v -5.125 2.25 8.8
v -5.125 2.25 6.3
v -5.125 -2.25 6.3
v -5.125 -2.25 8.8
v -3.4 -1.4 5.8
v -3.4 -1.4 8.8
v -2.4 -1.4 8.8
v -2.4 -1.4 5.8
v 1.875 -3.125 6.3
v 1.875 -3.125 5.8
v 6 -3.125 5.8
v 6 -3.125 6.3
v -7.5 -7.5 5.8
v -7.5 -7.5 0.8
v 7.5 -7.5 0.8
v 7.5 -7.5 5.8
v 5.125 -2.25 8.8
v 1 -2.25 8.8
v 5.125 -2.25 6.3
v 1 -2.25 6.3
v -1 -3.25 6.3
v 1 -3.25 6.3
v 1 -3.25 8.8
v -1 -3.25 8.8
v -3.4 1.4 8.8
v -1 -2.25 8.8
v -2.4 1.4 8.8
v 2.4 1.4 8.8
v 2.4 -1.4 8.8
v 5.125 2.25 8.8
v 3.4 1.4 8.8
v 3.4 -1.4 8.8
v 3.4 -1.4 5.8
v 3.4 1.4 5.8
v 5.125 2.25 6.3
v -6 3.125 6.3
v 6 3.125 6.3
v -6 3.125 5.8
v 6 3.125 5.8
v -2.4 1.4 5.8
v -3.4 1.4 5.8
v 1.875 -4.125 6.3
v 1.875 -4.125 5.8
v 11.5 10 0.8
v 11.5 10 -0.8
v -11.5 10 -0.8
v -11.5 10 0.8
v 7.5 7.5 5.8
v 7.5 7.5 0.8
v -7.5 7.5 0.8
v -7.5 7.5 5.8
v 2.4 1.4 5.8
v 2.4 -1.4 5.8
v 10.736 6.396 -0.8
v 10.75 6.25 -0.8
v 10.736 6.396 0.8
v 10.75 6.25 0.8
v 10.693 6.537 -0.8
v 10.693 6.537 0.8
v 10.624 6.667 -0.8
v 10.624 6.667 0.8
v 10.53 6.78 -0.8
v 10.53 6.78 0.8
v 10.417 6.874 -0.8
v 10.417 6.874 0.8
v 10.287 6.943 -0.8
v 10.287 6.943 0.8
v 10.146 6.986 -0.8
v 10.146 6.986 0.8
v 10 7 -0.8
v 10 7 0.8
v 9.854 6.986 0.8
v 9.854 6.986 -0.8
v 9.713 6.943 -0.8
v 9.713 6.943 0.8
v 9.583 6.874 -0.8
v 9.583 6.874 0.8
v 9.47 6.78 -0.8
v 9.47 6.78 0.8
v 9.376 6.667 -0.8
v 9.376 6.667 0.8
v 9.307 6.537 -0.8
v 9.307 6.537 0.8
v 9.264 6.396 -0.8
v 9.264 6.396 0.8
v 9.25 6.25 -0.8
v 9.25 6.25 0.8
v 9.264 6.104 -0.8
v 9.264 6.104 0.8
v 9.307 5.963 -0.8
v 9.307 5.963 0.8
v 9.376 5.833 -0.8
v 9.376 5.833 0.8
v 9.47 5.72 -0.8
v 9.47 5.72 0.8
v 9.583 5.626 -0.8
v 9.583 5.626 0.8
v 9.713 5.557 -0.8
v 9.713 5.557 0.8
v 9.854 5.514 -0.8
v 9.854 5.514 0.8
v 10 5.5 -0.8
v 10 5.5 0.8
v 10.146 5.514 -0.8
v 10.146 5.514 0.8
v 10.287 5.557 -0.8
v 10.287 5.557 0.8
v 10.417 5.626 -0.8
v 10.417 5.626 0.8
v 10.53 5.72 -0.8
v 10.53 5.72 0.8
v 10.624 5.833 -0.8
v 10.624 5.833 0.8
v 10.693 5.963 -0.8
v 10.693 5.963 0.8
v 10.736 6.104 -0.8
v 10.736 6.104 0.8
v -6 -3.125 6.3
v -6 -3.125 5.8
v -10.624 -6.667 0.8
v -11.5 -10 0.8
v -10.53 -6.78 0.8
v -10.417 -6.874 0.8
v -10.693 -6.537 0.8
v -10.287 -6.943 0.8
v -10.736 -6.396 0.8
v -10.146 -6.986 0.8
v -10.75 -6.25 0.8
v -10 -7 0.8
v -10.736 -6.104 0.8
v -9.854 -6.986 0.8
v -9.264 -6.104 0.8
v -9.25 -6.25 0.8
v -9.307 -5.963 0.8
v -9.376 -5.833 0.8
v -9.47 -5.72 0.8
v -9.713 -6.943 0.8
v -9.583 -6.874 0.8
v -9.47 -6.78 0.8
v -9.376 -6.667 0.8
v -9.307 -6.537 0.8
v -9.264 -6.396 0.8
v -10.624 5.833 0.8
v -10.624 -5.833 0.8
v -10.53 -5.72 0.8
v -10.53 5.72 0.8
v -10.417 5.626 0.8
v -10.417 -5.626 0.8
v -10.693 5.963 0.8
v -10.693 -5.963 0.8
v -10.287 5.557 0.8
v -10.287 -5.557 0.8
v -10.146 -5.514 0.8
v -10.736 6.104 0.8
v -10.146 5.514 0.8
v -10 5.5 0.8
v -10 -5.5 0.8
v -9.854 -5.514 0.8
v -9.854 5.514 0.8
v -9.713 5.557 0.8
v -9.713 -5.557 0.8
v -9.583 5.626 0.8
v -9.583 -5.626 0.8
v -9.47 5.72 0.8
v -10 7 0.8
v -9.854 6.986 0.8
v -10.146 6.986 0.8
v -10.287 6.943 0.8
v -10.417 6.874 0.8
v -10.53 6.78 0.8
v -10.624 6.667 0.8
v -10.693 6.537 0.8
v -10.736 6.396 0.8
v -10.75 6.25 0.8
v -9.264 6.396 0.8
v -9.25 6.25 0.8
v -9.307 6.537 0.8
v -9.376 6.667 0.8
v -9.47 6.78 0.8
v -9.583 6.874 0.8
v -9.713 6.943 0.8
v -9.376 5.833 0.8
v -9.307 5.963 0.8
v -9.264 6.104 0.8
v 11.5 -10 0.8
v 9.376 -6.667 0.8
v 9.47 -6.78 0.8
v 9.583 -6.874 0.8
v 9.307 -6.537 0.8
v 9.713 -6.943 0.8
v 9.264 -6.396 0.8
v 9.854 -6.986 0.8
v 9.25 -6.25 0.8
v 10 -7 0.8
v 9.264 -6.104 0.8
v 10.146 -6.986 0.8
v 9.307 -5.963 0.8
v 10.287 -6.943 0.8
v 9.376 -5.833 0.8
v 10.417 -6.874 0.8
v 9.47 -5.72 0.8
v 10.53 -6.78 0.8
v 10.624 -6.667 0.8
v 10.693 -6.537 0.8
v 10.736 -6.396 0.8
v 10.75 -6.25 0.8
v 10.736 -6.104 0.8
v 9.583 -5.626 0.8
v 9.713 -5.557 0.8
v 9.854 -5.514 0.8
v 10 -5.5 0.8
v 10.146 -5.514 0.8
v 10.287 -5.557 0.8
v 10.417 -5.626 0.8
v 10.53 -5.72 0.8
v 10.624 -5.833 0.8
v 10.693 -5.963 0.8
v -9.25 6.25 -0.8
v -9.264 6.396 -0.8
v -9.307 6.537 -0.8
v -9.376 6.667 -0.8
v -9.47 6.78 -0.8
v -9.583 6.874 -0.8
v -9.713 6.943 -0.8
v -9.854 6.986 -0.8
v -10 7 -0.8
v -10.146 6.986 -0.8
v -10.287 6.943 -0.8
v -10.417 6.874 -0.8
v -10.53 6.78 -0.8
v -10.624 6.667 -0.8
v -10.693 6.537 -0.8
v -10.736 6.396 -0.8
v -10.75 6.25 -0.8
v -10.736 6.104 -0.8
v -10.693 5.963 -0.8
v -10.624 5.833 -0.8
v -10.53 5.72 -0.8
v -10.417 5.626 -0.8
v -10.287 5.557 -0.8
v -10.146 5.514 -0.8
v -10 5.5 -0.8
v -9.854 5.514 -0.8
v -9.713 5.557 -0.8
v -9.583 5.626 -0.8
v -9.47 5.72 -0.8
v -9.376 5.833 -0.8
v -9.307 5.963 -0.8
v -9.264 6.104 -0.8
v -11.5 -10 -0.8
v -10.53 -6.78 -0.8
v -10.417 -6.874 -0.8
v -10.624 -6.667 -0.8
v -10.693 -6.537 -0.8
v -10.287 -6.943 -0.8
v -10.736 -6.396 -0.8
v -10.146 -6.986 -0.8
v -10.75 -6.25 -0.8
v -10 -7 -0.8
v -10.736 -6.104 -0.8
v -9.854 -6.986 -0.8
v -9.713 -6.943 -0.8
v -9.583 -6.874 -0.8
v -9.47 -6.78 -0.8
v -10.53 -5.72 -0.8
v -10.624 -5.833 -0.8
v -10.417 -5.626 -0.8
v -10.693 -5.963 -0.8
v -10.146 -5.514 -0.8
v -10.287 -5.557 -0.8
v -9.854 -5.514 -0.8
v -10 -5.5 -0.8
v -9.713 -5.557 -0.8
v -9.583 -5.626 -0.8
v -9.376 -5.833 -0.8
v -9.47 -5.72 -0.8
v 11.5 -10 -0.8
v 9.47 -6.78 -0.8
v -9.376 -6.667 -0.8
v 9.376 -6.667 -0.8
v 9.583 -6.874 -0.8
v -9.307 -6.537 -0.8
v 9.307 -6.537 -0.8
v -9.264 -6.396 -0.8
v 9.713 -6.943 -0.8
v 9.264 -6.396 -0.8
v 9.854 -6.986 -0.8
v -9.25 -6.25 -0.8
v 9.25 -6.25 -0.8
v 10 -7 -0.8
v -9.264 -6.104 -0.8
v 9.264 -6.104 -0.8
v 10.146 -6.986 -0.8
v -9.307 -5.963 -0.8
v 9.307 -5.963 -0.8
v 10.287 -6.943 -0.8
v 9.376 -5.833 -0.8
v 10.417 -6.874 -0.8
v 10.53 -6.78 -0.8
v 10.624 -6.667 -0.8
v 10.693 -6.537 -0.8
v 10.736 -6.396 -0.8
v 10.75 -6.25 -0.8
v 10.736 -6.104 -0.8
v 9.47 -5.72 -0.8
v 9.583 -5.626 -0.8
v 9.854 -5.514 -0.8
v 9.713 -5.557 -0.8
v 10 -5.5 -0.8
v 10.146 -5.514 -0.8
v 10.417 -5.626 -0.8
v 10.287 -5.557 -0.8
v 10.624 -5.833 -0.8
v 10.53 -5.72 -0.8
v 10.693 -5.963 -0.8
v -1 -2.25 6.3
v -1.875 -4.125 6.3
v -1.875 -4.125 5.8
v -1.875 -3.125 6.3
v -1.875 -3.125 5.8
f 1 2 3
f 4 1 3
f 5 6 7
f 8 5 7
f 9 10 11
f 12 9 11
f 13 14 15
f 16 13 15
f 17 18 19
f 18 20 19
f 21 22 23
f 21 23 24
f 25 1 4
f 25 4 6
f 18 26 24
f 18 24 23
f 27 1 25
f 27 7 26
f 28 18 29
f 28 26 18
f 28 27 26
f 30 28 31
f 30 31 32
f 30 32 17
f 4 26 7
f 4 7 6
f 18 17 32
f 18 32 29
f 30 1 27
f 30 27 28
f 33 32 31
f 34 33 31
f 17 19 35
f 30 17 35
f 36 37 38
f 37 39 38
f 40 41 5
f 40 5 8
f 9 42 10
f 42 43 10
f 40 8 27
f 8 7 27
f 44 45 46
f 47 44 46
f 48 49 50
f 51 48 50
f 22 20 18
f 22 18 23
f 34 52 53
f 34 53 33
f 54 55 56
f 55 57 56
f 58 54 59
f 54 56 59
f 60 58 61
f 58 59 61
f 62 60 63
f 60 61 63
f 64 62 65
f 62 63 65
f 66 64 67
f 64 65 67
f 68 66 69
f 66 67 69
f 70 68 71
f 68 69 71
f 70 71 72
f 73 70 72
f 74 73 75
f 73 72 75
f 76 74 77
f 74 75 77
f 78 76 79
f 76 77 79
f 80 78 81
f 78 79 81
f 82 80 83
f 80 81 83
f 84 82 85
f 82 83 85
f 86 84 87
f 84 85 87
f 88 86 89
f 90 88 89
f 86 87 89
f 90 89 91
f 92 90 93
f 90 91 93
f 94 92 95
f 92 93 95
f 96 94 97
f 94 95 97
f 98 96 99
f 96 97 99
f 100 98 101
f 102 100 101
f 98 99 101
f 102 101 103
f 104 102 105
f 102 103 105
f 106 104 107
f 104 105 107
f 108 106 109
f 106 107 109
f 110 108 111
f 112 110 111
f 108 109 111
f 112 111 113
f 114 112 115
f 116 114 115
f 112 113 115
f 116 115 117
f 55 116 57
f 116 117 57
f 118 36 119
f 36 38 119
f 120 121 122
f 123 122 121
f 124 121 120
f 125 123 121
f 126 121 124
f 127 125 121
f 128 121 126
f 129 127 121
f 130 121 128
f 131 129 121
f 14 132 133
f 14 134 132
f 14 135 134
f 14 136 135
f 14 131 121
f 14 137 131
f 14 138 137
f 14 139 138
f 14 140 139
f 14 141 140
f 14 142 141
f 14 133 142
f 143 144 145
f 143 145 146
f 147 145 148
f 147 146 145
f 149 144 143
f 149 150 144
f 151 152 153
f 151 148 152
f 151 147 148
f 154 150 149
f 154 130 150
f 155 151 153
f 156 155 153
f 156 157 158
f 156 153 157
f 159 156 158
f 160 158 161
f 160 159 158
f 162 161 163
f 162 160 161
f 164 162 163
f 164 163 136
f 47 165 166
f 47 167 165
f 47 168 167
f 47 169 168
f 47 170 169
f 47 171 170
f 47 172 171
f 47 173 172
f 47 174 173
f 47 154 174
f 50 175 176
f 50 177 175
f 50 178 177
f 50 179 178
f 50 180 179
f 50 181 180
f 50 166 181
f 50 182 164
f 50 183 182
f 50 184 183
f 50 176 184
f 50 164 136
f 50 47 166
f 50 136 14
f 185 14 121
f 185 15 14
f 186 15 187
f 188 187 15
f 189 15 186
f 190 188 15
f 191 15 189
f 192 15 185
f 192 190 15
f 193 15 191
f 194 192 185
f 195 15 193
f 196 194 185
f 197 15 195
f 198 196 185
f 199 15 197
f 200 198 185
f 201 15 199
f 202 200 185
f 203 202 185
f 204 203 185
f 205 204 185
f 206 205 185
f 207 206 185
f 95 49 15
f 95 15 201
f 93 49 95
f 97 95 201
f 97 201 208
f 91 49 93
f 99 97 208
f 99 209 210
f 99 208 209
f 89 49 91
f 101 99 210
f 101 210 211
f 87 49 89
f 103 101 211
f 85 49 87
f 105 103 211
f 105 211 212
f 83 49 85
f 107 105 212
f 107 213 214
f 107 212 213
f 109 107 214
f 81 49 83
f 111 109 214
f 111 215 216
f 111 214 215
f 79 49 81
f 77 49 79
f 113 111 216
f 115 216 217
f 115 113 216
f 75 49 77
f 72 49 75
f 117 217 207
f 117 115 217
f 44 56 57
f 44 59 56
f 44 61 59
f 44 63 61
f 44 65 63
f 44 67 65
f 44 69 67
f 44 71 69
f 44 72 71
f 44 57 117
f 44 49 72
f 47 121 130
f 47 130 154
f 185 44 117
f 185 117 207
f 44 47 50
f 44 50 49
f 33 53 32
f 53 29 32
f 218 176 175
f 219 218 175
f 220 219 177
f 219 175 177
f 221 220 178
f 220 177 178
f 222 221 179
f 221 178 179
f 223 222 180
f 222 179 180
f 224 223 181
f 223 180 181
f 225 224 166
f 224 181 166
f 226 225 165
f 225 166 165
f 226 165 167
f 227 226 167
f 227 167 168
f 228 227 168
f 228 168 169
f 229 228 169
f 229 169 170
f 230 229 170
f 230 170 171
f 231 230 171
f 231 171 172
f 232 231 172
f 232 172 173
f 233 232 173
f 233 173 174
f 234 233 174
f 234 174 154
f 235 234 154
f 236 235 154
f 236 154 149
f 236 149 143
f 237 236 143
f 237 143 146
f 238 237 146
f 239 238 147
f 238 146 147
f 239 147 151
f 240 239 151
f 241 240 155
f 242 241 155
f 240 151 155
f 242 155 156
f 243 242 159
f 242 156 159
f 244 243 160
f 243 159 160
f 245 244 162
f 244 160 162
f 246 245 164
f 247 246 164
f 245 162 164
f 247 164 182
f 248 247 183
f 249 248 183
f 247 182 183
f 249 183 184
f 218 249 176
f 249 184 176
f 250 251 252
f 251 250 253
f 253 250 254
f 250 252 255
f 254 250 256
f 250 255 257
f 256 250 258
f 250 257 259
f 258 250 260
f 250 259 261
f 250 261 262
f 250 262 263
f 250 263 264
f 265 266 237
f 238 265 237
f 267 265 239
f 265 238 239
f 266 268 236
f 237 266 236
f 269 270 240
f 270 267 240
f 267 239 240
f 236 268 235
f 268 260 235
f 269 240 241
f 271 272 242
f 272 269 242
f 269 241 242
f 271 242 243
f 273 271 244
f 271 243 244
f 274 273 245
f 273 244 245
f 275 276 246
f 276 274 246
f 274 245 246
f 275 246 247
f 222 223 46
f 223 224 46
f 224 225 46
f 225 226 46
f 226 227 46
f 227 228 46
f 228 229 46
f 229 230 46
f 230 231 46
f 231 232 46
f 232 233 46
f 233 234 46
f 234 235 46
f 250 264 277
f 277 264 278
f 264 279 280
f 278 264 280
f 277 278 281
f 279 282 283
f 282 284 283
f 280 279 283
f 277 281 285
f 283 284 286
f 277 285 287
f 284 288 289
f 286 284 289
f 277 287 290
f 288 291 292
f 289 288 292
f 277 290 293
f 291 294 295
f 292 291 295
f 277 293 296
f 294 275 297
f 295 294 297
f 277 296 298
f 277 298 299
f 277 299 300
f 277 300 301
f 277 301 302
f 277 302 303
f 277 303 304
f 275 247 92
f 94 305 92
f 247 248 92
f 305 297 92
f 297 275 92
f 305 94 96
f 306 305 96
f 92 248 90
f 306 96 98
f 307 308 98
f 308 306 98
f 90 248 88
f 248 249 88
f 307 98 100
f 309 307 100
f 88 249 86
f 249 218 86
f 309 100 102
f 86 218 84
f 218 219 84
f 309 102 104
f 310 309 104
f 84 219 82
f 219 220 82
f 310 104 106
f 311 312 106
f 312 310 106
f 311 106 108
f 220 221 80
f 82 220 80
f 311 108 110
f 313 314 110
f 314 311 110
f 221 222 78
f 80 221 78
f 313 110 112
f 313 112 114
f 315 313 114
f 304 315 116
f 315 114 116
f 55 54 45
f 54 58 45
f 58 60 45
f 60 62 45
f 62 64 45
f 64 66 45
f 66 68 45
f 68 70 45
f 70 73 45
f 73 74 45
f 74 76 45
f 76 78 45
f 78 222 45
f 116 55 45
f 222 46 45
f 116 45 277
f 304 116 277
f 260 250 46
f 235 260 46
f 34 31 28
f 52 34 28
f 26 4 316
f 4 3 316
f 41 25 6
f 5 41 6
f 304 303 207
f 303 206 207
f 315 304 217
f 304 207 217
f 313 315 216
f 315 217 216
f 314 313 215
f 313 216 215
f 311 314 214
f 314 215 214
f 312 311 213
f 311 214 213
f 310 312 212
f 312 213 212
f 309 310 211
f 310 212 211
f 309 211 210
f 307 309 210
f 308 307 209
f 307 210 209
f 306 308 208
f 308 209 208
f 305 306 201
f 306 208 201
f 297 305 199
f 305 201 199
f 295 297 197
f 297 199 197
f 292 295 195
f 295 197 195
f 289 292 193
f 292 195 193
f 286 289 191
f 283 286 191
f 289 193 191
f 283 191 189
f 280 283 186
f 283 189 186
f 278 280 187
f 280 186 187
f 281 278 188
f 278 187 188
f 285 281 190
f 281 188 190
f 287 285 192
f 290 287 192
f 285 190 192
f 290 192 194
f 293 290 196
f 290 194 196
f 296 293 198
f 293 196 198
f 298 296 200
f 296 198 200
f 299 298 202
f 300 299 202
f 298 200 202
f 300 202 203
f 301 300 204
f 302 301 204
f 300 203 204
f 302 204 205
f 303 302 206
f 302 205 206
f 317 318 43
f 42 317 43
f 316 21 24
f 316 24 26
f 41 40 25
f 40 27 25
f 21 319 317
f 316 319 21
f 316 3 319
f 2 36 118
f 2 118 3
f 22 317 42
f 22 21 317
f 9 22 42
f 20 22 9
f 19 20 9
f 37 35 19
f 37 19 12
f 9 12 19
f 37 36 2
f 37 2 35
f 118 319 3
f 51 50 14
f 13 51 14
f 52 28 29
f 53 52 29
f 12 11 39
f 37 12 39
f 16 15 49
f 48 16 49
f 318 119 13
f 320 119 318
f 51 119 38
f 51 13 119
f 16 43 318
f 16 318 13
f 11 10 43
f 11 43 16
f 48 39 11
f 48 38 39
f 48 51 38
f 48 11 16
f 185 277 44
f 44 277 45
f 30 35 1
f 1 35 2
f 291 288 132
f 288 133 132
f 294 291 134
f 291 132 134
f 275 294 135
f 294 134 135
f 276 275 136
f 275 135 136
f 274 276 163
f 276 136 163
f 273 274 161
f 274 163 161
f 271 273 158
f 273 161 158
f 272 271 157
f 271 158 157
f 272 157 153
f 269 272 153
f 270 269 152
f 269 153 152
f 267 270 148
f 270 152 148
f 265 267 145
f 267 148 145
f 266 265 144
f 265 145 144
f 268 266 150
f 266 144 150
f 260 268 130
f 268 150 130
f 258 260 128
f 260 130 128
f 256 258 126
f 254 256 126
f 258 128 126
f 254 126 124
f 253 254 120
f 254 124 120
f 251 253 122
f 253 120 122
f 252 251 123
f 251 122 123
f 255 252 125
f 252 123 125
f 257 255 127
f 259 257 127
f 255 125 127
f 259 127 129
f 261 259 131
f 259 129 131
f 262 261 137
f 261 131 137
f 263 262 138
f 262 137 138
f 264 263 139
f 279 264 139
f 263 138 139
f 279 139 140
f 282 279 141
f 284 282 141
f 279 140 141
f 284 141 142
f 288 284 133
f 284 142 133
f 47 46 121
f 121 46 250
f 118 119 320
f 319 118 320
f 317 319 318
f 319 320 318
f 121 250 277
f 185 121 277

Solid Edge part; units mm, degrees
sketch "Sketch1" plane through (0, 0, 0) normal (0, 0, 1) x (1, 0, 0)
  line L0 (11.5, -10) -> (11.5, 10)
  line L1 (11.5, 10) -> (-11.5, 10)
  line L2 (-11.5, 10) -> (-11.5, -10)
  line L3 (-11.5, -10) -> (11.5, -10)
extrude "Protrusion1" add sketch "Sketch1" along normal mid plane 1.6
sketch "Sketch2" plane through (0, 0, 0.8) normal (0, 0, 1) x (1, 0, 0)
  line L0 (7.5, -7.5) -> (7.5, 7.5)
  line L1 (7.5, 7.5) -> (-7.5, 7.5)
  line L2 (-7.5, 7.5) -> (-7.5, -7.5)
  line L3 (-7.5, -7.5) -> (7.5, -7.5)
extrude "ExtrudedCutout_1" add sketch "Sketch2" along normal blind 5
sketch "Sketch3" plane through (0, 0, 5.8) normal (0, 0, 1) x (1, 0, 0)
  line L0 (1, -3.25) -> (-1, -3.25)
  line L1 (-1, -3.25) -> (-1, -2.25)
  line L2 (-1, -2.25) -> (1, -2.25)
  line L3 (1, -2.25) -> (1, -3.25)
  line L4 (-5.125, -2.25) -> (5.125, -2.25)
  line L5 (5.125, -2.25) -> (5.125, 2.25)
  line L6 (5.125, 2.25) -> (-5.125, 2.25)
  line L7 (-5.125, 2.25) -> (-5.125, -2.25)
  dimension "D1" = 10.25
  dimension "D2" = 4.5
  dimension "D3" = 2
  dimension "D4" = 1
extrude "ExtrudedProtrusion_3" add sketch "Sketch3" along normal blind 3
sketch "Sketch4" plane through (0, 0, 5.8) normal (0, 0, 1) x (1, 0, 0)
  line L0 (1, -2.25) -> (1, -3.25)
  line L1 (1, -3.25) -> (-1, -3.25)
  line L2 (-1, -3.25) -> (-1, -2.25)
  line L3 (-5.125, -2.25) -> (-1, -2.25)
  line L4 (-5.125, 2.25) -> (-5.125, -2.25)
  line L5 (5.125, 2.25) -> (-5.125, 2.25)
  line L6 (5.125, -2.25) -> (5.125, 2.25)
  line L7 (1, -2.25) -> (5.125, -2.25)
  line L8 (1.875, -4.125) -> (1.875, -3.125)
  line L9 (1.875, -3.125) -> (6, -3.125)
  line L10 (6, -3.125) -> (6, 3.125)
  line L11 (6, 3.125) -> (-6, 3.125)
  line L12 (-6, 3.125) -> (-6, -3.125)
  line L13 (-6, -3.125) -> (-1.875, -3.125)
  line L14 (-1.875, -3.125) -> (-1.875, -4.125)
  line L15 (-1.875, -4.125) -> (1.875, -4.125)
  dimension "D1" = 12
extrude "ExtrudedProtrusion_4" add sketch "Sketch4" along normal blind 0.5
sketch "Sketch5" plane through (0, 0, 0.8) normal (0, 0, 1) x (1, 0, 0)
  circle A0 centre (-10, 6.25) radius 0.75
  circle A1 centre (10, 6.25) radius 0.75
  circle A2 centre (10, -6.25) radius 0.75
  circle A3 centre (-10, -6.25) radius 0.75
  dimension "D1" = 20
  dimension "D2" = 12.5
  dimension "D3" = 1.5
extrude "Cutout1" cut sketch "Sketch5" against normal up to vertex (1.6 mm away)
sketch "Sketch6" plane through (0, -0.5, 8.8) normal (0, 0, 1) x (1, 0, 0)
  line L0 (-3.4, 1.9) -> (-3.4, -0.9)
  line L1 (-3.4, -0.9) -> (-2.4, -0.9)
  line L2 (-2.4, -0.9) -> (-2.4, 1.9)
  line L3 (-2.4, 1.9) -> (-3.4, 1.9)
  line L4 (3.4, -0.9) -> (3.4, 1.9)
  line L5 (3.4, 1.9) -> (2.4, 1.9)
  line L6 (2.4, 1.9) -> (2.4, -0.9)
  line L7 (2.4, -0.9) -> (3.4, -0.9)
  dimension "D1" = 1
  dimension "D2" = 2.8
  dimension "D3" = 6.8
extrude "Cutout2" cut sketch "Sketch6" against normal up to vertex (3 mm away)
properties material "Polycarbonate"
